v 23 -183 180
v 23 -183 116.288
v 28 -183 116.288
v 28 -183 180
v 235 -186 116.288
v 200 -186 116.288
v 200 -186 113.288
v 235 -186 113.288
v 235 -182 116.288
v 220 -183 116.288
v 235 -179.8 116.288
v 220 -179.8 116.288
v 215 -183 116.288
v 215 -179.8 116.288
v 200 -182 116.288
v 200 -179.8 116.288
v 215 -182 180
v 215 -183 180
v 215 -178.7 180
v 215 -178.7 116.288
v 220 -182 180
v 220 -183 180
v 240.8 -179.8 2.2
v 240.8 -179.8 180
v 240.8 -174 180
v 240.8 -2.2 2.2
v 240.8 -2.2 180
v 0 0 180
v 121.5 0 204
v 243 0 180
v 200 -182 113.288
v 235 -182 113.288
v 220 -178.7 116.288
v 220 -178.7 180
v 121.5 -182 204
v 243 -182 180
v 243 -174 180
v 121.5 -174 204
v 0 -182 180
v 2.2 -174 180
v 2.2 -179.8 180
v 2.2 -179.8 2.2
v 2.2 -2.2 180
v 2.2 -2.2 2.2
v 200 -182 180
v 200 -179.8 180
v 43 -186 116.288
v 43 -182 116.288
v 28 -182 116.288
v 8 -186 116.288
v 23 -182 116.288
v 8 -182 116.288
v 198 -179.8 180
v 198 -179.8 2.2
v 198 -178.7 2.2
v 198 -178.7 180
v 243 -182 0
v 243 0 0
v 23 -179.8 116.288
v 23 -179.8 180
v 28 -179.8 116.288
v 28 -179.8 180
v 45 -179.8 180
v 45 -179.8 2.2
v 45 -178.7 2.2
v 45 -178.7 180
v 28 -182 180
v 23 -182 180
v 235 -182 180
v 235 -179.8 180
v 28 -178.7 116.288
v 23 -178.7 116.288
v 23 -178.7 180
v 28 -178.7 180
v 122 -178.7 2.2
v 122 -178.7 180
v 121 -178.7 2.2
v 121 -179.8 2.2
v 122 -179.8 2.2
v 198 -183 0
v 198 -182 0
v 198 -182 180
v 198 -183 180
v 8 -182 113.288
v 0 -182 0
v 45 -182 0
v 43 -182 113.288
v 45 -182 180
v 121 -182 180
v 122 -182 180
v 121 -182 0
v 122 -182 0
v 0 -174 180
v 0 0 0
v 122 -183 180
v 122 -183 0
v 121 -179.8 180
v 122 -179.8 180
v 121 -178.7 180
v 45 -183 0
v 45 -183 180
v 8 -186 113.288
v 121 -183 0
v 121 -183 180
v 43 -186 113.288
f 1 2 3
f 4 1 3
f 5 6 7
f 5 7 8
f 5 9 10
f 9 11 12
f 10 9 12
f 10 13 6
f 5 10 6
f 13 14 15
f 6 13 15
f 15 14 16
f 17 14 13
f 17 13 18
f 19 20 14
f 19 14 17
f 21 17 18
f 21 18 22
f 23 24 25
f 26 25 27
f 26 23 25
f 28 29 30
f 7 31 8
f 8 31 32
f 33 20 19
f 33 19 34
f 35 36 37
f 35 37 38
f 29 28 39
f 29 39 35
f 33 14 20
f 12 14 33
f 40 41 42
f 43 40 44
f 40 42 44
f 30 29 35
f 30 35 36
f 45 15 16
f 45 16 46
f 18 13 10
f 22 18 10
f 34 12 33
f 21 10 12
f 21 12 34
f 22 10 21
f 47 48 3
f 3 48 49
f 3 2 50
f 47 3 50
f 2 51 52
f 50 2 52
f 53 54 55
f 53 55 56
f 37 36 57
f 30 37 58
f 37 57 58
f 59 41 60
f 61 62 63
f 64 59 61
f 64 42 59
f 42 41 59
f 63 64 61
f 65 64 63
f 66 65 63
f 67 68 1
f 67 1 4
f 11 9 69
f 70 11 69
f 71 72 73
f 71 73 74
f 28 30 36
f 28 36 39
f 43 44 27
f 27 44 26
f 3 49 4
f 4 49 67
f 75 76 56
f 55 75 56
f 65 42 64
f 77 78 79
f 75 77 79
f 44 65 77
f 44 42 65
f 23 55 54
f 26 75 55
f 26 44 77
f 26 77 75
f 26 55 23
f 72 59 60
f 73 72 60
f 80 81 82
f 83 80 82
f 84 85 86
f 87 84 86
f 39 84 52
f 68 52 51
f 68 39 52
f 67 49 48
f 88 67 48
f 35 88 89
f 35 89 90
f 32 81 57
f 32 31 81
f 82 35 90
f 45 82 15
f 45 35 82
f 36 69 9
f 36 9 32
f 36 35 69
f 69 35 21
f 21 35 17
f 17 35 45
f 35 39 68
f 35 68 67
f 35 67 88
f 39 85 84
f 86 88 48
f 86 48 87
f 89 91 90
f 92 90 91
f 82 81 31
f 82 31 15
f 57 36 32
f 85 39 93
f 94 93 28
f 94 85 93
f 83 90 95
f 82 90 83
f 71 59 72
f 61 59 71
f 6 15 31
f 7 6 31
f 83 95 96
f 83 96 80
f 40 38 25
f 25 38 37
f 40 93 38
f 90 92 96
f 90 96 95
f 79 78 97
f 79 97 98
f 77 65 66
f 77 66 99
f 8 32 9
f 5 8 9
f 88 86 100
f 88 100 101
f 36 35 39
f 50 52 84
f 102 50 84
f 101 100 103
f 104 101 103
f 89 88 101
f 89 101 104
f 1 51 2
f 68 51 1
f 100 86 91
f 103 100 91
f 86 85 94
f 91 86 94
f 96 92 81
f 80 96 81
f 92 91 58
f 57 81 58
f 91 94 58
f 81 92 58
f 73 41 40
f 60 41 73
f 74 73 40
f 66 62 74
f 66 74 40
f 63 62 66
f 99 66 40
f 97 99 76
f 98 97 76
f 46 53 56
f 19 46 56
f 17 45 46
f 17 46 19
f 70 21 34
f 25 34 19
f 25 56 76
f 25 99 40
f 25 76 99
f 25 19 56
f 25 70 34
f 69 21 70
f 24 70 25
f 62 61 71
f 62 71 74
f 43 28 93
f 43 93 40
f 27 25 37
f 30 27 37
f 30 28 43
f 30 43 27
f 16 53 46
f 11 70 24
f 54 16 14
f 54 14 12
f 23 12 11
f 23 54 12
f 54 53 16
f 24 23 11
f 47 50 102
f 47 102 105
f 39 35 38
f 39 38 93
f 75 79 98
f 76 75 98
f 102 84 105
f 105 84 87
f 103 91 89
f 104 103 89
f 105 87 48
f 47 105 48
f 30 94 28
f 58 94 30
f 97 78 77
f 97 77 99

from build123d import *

# Parameters (mm, degrees)
F0_W          = 243
F0_H          = 182
F0_W_2        = 238.6
F0_H_2        = 177.6
F1_DEPTH      = 180
F2_DEPTH      = 2.2
F3_W          = 76
F3_H          = 180
F3_W_2        = 5
F3_H_2        = 63.7124854326
F4_DEPTH      = 1
F4_DEPTH_BACK = 3.3
F3_W_3        = 15
F5_DEPTH      = 25
F6_DEPTH      = 8
F7_DEPTH      = 4
F9_DEPTH      = 182


# Not quite as in the source:
# - a feature names something its author has since deleted; it is built from what else it names


with BuildPart() as f1:
    # F0 (on Top) → F1 (new body)
    with BuildSketch(Plane.XY):
        with Locations((121.5, -91)):
            Rectangle(F0_W, F0_H)
        with Locations((121.5, -91)):
            Rectangle(F0_W_2, F0_H_2, mode=Mode.SUBTRACT)
    extrude(amount=F1_DEPTH)

    # F0 (on Top) → F2 (join)
    with BuildSketch(Plane.XY):
        with Locations((121.5, -91)):
            Rectangle(F0_W_2, F0_H_2)
    extrude(amount=F2_DEPTH)

    # F3 (on face) → F4 (join, two sides)
    with BuildSketch(Plane.XZ.offset(182)) as f4_sk:
        with Locations((83, 90)):
            Rectangle(F3_W, F3_H)
        with Locations((160, 90)):
            Rectangle(F3_W, F3_H)
        with Locations((25.5, 148.1437572837)):
            Rectangle(F3_W_2, F3_H_2)
        with Locations((217.5, 148.1437572837)):
            Rectangle(F3_W_2, F3_H_2)
    extrude(amount=F4_DEPTH)
    extrude(f4_sk.sketch, amount=-F4_DEPTH_BACK)

    # F3 (on face) → F5 (cut)
    with BuildSketch(Plane.XZ.offset(182)):
        Polygon((43, 180), (45, 180), (121, 180), (122, 180), (198, 180), (200, 180), (215, 180), (220, 180), (235, 180), (243, 180), (121.5, 204), (0, 180), (8, 180), (23, 180), (28, 180), align=None)
        with Locations((207.5, 148.1437572837)):
            Rectangle(F3_W_3, F3_H_2)
        with Locations((227.5, 148.1437572837)):
            Rectangle(F3_W_3, F3_H_2)
    extrude(amount=-F5_DEPTH, mode=Mode.SUBTRACT)

    # F3 (on face) → F6 (join)
    with BuildSketch(Plane.XZ.offset(182)):
        Polygon((43, 180), (45, 180), (121, 180), (122, 180), (198, 180), (200, 180), (215, 180), (220, 180), (235, 180), (243, 180), (121.5, 204), (0, 180), (8, 180), (23, 180), (28, 180), align=None)
    extrude(amount=-F6_DEPTH)

    # F3 (on face) → F7 (join)
    with BuildSketch(Plane.XZ.offset(182)):
        Polygon((215, 116.2875145674), (200, 116.2875145674), (200, 113.2875145674), (235, 113.2875145674), (235, 116.2875145674), (220, 116.2875145674), align=None)
        Polygon((43, 113.2875145674), (43, 116.2875145674), (28, 116.2875145674), (23, 116.2875145674), (8, 116.2875145674), (8, 113.2875145674), align=None)
    extrude(amount=F7_DEPTH)


with BuildPart() as f9:
    # F8 (on face) → F9 (new body)
    with BuildSketch(Plane(origin=(0, 0, 0), x_dir=(-1, 0, 0), z_dir=(0, 1, 0))):
        Polygon((-121.5, 204), (-243, 180), (0, 180), align=None)
    extrude(amount=-F9_DEPTH)


solid = Compound([f1.part, f9.part])
